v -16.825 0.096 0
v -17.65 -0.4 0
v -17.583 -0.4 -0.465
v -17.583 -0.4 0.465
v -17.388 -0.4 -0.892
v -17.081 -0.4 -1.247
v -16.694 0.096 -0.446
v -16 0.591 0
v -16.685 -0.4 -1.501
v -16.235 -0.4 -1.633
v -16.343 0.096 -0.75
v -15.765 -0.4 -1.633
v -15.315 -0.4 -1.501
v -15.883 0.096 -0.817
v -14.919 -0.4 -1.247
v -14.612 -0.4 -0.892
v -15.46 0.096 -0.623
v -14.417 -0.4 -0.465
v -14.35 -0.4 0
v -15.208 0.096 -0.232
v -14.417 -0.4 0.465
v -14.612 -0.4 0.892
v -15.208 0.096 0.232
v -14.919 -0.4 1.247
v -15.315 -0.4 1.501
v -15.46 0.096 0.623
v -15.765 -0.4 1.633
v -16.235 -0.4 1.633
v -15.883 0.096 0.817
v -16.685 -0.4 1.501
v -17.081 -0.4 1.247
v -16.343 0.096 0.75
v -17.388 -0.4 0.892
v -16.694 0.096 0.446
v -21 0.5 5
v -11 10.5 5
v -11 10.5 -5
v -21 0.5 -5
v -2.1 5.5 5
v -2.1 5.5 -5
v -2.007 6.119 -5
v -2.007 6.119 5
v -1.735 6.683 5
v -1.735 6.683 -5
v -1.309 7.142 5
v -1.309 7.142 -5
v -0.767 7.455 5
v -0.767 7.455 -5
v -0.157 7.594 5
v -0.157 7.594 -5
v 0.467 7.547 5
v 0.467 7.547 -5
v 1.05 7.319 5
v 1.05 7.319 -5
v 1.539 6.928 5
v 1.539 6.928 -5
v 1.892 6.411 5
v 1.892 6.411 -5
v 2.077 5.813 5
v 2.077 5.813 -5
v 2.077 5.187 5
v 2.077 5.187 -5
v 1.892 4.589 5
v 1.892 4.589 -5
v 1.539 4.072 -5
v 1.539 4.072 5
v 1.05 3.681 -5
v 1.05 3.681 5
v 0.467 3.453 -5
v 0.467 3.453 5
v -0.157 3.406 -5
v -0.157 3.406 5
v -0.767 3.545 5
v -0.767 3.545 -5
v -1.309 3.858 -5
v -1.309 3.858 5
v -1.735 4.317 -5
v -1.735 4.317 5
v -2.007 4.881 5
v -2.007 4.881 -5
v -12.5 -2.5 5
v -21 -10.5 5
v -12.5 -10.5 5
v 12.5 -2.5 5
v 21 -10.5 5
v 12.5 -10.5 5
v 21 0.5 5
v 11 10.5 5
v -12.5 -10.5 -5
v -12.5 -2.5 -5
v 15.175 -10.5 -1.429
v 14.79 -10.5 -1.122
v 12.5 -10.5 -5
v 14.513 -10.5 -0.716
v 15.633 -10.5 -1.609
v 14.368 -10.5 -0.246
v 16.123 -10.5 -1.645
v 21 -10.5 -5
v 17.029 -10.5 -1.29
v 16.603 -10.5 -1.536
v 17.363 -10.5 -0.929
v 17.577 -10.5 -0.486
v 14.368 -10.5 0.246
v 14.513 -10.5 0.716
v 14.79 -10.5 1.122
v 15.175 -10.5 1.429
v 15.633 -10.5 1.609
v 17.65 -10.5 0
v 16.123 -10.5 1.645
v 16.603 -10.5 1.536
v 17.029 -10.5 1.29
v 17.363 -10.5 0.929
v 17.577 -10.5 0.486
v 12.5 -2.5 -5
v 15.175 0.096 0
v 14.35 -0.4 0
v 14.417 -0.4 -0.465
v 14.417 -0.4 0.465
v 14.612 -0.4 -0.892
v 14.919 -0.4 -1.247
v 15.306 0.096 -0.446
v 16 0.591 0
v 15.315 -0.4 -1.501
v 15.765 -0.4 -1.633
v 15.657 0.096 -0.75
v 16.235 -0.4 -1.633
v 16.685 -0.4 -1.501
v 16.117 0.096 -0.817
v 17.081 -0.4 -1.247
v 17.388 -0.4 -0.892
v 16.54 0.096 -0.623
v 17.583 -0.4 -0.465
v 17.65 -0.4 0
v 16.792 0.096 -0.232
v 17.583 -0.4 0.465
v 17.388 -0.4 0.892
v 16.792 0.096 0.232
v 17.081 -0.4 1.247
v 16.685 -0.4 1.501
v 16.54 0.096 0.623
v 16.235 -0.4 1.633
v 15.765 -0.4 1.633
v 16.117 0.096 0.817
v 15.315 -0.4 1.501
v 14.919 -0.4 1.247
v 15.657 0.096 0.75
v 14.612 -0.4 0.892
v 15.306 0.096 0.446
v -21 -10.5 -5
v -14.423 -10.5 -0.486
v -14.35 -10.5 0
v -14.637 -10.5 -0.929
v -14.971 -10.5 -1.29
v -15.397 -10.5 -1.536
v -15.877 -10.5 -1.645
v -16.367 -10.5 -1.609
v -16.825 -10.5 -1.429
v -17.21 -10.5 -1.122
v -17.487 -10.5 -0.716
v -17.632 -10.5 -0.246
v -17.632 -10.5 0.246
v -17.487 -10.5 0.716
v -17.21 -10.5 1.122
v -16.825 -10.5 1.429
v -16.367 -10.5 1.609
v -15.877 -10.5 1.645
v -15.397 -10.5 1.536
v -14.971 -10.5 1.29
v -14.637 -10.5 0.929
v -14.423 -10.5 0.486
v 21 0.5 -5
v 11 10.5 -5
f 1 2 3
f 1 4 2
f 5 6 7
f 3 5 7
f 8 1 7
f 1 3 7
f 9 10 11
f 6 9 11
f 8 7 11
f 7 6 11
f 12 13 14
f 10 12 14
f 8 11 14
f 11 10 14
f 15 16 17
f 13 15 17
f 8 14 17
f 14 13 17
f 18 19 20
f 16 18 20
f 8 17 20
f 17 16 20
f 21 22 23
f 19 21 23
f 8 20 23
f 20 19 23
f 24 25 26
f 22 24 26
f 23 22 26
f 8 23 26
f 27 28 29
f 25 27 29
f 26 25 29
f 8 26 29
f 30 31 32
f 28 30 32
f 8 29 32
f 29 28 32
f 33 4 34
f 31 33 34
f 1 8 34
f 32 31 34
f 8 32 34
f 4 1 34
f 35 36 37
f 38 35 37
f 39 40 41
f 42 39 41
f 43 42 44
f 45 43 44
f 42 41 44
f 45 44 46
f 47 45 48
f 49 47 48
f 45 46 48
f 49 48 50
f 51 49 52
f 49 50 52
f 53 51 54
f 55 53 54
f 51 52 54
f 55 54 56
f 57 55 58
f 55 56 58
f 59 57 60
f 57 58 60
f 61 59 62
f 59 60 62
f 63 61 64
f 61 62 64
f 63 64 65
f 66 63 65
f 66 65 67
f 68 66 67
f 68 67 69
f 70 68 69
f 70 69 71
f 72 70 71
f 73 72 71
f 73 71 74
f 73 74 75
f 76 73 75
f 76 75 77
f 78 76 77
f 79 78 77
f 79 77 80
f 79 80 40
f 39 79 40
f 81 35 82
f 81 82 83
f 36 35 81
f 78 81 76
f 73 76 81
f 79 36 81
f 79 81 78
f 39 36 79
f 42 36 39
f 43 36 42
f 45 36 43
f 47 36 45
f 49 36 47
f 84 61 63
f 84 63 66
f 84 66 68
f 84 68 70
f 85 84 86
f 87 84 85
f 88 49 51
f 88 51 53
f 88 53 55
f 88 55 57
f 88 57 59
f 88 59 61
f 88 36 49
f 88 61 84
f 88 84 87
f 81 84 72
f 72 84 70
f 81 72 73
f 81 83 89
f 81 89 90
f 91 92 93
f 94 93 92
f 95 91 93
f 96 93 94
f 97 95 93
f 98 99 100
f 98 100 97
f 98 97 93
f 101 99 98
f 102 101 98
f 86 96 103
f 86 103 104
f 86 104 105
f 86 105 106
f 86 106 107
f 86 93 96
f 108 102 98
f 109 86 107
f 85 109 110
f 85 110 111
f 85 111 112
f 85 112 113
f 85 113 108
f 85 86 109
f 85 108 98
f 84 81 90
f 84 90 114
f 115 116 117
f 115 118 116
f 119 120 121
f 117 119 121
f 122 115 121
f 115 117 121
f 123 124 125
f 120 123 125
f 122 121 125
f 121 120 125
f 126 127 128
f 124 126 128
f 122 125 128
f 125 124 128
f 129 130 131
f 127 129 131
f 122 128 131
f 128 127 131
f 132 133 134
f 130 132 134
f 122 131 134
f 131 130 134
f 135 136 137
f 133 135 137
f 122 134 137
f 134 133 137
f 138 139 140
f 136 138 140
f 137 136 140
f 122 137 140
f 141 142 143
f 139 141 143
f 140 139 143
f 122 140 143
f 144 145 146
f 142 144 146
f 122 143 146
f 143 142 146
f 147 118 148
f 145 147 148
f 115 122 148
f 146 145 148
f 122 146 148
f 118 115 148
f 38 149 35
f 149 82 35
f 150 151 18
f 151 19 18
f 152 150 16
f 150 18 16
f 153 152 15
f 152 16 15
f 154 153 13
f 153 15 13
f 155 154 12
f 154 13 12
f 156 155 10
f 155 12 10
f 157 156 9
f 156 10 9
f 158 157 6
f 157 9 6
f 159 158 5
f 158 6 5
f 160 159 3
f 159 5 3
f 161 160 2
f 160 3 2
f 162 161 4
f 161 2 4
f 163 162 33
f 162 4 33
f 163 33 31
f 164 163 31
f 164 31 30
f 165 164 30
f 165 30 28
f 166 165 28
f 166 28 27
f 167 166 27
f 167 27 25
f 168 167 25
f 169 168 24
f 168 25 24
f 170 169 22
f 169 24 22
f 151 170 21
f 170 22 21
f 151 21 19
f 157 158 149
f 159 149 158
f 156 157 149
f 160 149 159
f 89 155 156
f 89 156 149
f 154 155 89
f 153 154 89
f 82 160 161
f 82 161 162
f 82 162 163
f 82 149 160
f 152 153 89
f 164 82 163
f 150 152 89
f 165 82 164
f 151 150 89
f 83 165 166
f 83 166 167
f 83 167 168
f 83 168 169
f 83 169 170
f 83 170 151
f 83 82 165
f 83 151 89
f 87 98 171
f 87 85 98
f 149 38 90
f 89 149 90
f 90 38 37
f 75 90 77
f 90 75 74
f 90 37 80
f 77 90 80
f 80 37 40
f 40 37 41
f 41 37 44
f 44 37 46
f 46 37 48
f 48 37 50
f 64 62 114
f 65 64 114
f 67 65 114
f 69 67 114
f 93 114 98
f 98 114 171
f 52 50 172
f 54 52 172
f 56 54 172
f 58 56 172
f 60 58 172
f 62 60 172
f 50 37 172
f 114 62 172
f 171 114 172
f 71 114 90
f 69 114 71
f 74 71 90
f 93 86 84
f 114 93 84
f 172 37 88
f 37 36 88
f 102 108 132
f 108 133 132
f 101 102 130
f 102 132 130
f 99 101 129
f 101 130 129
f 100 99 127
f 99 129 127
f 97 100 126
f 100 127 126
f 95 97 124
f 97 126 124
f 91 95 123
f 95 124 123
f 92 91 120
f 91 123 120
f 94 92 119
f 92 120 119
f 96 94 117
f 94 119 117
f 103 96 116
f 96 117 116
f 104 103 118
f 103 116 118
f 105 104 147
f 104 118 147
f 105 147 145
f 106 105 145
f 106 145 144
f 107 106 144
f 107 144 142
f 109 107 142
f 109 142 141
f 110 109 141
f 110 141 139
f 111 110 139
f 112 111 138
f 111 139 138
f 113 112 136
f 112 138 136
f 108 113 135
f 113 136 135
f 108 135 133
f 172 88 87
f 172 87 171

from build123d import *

# Parameters (mm, degrees)
SKETCH_1_W             = 42
SKETCH_1_H             = 21
EXTRUDE_1_DEPTH        = 5
SKETCH_2_W             = 25
SKETCH_2_H             = 8
CUT_EXTRUDE_1_DEPTH    = 26.51960031
HOLE_WIZARD_M4_1_D     = 3.3
HOLE_WIZARD_M4_1_DEPTH = 10.1
HOLE_WIZARD_M4_1_TIP   = 0.991420021
HOLE_WIZARD_M5_1_D     = 4.2
CHAMFER_1_SIZE         = 10


with BuildPart() as part:
    # 草图1 → 凸台-拉伸1 (new, symmetric)
    with BuildSketch(Plane.XY):
        Rectangle(SKETCH_1_W, SKETCH_1_H)
    extrude(amount=EXTRUDE_1_DEPTH, both=True)

    # 草图2 → 切除-拉伸1 (cut, through all)
    with BuildSketch(Plane.XY.offset(5)):
        with Locations((0, -6.5)):
            Rectangle(SKETCH_2_W, SKETCH_2_H)
    extrude(amount=-CUT_EXTRUDE_1_DEPTH, mode=Mode.SUBTRACT)

    # M4 螺纹孔1
    with Locations(Plane(origin=(0, -10.5, 0), x_dir=(-1, 0, 0), z_dir=(0, -1, 0))):
        with Locations((16, 0), (-16, 0)):
            Hole(HOLE_WIZARD_M4_1_D / 2, depth=HOLE_WIZARD_M4_1_DEPTH)
            with Locations((0, 0, -(HOLE_WIZARD_M4_1_DEPTH + HOLE_WIZARD_M4_1_TIP / 2))):  # 118° drill point
                Cone(0, HOLE_WIZARD_M4_1_D / 2, HOLE_WIZARD_M4_1_TIP, mode=Mode.SUBTRACT)

    # M5 螺纹孔1 (through all)
    with Locations(Plane.XY.offset(5)):
        with Locations((0, 5.5)):
            Hole(HOLE_WIZARD_M5_1_D / 2)

    # 倒角1
    chamfer_1_edges = [part.edges().sort_by_distance(p)[0] for p in [
        (-21, 10.5, 0),
        (21, 10.5, 0),
    ]]
    chamfer(chamfer_1_edges, length=CHAMFER_1_SIZE)


solid = part.part
